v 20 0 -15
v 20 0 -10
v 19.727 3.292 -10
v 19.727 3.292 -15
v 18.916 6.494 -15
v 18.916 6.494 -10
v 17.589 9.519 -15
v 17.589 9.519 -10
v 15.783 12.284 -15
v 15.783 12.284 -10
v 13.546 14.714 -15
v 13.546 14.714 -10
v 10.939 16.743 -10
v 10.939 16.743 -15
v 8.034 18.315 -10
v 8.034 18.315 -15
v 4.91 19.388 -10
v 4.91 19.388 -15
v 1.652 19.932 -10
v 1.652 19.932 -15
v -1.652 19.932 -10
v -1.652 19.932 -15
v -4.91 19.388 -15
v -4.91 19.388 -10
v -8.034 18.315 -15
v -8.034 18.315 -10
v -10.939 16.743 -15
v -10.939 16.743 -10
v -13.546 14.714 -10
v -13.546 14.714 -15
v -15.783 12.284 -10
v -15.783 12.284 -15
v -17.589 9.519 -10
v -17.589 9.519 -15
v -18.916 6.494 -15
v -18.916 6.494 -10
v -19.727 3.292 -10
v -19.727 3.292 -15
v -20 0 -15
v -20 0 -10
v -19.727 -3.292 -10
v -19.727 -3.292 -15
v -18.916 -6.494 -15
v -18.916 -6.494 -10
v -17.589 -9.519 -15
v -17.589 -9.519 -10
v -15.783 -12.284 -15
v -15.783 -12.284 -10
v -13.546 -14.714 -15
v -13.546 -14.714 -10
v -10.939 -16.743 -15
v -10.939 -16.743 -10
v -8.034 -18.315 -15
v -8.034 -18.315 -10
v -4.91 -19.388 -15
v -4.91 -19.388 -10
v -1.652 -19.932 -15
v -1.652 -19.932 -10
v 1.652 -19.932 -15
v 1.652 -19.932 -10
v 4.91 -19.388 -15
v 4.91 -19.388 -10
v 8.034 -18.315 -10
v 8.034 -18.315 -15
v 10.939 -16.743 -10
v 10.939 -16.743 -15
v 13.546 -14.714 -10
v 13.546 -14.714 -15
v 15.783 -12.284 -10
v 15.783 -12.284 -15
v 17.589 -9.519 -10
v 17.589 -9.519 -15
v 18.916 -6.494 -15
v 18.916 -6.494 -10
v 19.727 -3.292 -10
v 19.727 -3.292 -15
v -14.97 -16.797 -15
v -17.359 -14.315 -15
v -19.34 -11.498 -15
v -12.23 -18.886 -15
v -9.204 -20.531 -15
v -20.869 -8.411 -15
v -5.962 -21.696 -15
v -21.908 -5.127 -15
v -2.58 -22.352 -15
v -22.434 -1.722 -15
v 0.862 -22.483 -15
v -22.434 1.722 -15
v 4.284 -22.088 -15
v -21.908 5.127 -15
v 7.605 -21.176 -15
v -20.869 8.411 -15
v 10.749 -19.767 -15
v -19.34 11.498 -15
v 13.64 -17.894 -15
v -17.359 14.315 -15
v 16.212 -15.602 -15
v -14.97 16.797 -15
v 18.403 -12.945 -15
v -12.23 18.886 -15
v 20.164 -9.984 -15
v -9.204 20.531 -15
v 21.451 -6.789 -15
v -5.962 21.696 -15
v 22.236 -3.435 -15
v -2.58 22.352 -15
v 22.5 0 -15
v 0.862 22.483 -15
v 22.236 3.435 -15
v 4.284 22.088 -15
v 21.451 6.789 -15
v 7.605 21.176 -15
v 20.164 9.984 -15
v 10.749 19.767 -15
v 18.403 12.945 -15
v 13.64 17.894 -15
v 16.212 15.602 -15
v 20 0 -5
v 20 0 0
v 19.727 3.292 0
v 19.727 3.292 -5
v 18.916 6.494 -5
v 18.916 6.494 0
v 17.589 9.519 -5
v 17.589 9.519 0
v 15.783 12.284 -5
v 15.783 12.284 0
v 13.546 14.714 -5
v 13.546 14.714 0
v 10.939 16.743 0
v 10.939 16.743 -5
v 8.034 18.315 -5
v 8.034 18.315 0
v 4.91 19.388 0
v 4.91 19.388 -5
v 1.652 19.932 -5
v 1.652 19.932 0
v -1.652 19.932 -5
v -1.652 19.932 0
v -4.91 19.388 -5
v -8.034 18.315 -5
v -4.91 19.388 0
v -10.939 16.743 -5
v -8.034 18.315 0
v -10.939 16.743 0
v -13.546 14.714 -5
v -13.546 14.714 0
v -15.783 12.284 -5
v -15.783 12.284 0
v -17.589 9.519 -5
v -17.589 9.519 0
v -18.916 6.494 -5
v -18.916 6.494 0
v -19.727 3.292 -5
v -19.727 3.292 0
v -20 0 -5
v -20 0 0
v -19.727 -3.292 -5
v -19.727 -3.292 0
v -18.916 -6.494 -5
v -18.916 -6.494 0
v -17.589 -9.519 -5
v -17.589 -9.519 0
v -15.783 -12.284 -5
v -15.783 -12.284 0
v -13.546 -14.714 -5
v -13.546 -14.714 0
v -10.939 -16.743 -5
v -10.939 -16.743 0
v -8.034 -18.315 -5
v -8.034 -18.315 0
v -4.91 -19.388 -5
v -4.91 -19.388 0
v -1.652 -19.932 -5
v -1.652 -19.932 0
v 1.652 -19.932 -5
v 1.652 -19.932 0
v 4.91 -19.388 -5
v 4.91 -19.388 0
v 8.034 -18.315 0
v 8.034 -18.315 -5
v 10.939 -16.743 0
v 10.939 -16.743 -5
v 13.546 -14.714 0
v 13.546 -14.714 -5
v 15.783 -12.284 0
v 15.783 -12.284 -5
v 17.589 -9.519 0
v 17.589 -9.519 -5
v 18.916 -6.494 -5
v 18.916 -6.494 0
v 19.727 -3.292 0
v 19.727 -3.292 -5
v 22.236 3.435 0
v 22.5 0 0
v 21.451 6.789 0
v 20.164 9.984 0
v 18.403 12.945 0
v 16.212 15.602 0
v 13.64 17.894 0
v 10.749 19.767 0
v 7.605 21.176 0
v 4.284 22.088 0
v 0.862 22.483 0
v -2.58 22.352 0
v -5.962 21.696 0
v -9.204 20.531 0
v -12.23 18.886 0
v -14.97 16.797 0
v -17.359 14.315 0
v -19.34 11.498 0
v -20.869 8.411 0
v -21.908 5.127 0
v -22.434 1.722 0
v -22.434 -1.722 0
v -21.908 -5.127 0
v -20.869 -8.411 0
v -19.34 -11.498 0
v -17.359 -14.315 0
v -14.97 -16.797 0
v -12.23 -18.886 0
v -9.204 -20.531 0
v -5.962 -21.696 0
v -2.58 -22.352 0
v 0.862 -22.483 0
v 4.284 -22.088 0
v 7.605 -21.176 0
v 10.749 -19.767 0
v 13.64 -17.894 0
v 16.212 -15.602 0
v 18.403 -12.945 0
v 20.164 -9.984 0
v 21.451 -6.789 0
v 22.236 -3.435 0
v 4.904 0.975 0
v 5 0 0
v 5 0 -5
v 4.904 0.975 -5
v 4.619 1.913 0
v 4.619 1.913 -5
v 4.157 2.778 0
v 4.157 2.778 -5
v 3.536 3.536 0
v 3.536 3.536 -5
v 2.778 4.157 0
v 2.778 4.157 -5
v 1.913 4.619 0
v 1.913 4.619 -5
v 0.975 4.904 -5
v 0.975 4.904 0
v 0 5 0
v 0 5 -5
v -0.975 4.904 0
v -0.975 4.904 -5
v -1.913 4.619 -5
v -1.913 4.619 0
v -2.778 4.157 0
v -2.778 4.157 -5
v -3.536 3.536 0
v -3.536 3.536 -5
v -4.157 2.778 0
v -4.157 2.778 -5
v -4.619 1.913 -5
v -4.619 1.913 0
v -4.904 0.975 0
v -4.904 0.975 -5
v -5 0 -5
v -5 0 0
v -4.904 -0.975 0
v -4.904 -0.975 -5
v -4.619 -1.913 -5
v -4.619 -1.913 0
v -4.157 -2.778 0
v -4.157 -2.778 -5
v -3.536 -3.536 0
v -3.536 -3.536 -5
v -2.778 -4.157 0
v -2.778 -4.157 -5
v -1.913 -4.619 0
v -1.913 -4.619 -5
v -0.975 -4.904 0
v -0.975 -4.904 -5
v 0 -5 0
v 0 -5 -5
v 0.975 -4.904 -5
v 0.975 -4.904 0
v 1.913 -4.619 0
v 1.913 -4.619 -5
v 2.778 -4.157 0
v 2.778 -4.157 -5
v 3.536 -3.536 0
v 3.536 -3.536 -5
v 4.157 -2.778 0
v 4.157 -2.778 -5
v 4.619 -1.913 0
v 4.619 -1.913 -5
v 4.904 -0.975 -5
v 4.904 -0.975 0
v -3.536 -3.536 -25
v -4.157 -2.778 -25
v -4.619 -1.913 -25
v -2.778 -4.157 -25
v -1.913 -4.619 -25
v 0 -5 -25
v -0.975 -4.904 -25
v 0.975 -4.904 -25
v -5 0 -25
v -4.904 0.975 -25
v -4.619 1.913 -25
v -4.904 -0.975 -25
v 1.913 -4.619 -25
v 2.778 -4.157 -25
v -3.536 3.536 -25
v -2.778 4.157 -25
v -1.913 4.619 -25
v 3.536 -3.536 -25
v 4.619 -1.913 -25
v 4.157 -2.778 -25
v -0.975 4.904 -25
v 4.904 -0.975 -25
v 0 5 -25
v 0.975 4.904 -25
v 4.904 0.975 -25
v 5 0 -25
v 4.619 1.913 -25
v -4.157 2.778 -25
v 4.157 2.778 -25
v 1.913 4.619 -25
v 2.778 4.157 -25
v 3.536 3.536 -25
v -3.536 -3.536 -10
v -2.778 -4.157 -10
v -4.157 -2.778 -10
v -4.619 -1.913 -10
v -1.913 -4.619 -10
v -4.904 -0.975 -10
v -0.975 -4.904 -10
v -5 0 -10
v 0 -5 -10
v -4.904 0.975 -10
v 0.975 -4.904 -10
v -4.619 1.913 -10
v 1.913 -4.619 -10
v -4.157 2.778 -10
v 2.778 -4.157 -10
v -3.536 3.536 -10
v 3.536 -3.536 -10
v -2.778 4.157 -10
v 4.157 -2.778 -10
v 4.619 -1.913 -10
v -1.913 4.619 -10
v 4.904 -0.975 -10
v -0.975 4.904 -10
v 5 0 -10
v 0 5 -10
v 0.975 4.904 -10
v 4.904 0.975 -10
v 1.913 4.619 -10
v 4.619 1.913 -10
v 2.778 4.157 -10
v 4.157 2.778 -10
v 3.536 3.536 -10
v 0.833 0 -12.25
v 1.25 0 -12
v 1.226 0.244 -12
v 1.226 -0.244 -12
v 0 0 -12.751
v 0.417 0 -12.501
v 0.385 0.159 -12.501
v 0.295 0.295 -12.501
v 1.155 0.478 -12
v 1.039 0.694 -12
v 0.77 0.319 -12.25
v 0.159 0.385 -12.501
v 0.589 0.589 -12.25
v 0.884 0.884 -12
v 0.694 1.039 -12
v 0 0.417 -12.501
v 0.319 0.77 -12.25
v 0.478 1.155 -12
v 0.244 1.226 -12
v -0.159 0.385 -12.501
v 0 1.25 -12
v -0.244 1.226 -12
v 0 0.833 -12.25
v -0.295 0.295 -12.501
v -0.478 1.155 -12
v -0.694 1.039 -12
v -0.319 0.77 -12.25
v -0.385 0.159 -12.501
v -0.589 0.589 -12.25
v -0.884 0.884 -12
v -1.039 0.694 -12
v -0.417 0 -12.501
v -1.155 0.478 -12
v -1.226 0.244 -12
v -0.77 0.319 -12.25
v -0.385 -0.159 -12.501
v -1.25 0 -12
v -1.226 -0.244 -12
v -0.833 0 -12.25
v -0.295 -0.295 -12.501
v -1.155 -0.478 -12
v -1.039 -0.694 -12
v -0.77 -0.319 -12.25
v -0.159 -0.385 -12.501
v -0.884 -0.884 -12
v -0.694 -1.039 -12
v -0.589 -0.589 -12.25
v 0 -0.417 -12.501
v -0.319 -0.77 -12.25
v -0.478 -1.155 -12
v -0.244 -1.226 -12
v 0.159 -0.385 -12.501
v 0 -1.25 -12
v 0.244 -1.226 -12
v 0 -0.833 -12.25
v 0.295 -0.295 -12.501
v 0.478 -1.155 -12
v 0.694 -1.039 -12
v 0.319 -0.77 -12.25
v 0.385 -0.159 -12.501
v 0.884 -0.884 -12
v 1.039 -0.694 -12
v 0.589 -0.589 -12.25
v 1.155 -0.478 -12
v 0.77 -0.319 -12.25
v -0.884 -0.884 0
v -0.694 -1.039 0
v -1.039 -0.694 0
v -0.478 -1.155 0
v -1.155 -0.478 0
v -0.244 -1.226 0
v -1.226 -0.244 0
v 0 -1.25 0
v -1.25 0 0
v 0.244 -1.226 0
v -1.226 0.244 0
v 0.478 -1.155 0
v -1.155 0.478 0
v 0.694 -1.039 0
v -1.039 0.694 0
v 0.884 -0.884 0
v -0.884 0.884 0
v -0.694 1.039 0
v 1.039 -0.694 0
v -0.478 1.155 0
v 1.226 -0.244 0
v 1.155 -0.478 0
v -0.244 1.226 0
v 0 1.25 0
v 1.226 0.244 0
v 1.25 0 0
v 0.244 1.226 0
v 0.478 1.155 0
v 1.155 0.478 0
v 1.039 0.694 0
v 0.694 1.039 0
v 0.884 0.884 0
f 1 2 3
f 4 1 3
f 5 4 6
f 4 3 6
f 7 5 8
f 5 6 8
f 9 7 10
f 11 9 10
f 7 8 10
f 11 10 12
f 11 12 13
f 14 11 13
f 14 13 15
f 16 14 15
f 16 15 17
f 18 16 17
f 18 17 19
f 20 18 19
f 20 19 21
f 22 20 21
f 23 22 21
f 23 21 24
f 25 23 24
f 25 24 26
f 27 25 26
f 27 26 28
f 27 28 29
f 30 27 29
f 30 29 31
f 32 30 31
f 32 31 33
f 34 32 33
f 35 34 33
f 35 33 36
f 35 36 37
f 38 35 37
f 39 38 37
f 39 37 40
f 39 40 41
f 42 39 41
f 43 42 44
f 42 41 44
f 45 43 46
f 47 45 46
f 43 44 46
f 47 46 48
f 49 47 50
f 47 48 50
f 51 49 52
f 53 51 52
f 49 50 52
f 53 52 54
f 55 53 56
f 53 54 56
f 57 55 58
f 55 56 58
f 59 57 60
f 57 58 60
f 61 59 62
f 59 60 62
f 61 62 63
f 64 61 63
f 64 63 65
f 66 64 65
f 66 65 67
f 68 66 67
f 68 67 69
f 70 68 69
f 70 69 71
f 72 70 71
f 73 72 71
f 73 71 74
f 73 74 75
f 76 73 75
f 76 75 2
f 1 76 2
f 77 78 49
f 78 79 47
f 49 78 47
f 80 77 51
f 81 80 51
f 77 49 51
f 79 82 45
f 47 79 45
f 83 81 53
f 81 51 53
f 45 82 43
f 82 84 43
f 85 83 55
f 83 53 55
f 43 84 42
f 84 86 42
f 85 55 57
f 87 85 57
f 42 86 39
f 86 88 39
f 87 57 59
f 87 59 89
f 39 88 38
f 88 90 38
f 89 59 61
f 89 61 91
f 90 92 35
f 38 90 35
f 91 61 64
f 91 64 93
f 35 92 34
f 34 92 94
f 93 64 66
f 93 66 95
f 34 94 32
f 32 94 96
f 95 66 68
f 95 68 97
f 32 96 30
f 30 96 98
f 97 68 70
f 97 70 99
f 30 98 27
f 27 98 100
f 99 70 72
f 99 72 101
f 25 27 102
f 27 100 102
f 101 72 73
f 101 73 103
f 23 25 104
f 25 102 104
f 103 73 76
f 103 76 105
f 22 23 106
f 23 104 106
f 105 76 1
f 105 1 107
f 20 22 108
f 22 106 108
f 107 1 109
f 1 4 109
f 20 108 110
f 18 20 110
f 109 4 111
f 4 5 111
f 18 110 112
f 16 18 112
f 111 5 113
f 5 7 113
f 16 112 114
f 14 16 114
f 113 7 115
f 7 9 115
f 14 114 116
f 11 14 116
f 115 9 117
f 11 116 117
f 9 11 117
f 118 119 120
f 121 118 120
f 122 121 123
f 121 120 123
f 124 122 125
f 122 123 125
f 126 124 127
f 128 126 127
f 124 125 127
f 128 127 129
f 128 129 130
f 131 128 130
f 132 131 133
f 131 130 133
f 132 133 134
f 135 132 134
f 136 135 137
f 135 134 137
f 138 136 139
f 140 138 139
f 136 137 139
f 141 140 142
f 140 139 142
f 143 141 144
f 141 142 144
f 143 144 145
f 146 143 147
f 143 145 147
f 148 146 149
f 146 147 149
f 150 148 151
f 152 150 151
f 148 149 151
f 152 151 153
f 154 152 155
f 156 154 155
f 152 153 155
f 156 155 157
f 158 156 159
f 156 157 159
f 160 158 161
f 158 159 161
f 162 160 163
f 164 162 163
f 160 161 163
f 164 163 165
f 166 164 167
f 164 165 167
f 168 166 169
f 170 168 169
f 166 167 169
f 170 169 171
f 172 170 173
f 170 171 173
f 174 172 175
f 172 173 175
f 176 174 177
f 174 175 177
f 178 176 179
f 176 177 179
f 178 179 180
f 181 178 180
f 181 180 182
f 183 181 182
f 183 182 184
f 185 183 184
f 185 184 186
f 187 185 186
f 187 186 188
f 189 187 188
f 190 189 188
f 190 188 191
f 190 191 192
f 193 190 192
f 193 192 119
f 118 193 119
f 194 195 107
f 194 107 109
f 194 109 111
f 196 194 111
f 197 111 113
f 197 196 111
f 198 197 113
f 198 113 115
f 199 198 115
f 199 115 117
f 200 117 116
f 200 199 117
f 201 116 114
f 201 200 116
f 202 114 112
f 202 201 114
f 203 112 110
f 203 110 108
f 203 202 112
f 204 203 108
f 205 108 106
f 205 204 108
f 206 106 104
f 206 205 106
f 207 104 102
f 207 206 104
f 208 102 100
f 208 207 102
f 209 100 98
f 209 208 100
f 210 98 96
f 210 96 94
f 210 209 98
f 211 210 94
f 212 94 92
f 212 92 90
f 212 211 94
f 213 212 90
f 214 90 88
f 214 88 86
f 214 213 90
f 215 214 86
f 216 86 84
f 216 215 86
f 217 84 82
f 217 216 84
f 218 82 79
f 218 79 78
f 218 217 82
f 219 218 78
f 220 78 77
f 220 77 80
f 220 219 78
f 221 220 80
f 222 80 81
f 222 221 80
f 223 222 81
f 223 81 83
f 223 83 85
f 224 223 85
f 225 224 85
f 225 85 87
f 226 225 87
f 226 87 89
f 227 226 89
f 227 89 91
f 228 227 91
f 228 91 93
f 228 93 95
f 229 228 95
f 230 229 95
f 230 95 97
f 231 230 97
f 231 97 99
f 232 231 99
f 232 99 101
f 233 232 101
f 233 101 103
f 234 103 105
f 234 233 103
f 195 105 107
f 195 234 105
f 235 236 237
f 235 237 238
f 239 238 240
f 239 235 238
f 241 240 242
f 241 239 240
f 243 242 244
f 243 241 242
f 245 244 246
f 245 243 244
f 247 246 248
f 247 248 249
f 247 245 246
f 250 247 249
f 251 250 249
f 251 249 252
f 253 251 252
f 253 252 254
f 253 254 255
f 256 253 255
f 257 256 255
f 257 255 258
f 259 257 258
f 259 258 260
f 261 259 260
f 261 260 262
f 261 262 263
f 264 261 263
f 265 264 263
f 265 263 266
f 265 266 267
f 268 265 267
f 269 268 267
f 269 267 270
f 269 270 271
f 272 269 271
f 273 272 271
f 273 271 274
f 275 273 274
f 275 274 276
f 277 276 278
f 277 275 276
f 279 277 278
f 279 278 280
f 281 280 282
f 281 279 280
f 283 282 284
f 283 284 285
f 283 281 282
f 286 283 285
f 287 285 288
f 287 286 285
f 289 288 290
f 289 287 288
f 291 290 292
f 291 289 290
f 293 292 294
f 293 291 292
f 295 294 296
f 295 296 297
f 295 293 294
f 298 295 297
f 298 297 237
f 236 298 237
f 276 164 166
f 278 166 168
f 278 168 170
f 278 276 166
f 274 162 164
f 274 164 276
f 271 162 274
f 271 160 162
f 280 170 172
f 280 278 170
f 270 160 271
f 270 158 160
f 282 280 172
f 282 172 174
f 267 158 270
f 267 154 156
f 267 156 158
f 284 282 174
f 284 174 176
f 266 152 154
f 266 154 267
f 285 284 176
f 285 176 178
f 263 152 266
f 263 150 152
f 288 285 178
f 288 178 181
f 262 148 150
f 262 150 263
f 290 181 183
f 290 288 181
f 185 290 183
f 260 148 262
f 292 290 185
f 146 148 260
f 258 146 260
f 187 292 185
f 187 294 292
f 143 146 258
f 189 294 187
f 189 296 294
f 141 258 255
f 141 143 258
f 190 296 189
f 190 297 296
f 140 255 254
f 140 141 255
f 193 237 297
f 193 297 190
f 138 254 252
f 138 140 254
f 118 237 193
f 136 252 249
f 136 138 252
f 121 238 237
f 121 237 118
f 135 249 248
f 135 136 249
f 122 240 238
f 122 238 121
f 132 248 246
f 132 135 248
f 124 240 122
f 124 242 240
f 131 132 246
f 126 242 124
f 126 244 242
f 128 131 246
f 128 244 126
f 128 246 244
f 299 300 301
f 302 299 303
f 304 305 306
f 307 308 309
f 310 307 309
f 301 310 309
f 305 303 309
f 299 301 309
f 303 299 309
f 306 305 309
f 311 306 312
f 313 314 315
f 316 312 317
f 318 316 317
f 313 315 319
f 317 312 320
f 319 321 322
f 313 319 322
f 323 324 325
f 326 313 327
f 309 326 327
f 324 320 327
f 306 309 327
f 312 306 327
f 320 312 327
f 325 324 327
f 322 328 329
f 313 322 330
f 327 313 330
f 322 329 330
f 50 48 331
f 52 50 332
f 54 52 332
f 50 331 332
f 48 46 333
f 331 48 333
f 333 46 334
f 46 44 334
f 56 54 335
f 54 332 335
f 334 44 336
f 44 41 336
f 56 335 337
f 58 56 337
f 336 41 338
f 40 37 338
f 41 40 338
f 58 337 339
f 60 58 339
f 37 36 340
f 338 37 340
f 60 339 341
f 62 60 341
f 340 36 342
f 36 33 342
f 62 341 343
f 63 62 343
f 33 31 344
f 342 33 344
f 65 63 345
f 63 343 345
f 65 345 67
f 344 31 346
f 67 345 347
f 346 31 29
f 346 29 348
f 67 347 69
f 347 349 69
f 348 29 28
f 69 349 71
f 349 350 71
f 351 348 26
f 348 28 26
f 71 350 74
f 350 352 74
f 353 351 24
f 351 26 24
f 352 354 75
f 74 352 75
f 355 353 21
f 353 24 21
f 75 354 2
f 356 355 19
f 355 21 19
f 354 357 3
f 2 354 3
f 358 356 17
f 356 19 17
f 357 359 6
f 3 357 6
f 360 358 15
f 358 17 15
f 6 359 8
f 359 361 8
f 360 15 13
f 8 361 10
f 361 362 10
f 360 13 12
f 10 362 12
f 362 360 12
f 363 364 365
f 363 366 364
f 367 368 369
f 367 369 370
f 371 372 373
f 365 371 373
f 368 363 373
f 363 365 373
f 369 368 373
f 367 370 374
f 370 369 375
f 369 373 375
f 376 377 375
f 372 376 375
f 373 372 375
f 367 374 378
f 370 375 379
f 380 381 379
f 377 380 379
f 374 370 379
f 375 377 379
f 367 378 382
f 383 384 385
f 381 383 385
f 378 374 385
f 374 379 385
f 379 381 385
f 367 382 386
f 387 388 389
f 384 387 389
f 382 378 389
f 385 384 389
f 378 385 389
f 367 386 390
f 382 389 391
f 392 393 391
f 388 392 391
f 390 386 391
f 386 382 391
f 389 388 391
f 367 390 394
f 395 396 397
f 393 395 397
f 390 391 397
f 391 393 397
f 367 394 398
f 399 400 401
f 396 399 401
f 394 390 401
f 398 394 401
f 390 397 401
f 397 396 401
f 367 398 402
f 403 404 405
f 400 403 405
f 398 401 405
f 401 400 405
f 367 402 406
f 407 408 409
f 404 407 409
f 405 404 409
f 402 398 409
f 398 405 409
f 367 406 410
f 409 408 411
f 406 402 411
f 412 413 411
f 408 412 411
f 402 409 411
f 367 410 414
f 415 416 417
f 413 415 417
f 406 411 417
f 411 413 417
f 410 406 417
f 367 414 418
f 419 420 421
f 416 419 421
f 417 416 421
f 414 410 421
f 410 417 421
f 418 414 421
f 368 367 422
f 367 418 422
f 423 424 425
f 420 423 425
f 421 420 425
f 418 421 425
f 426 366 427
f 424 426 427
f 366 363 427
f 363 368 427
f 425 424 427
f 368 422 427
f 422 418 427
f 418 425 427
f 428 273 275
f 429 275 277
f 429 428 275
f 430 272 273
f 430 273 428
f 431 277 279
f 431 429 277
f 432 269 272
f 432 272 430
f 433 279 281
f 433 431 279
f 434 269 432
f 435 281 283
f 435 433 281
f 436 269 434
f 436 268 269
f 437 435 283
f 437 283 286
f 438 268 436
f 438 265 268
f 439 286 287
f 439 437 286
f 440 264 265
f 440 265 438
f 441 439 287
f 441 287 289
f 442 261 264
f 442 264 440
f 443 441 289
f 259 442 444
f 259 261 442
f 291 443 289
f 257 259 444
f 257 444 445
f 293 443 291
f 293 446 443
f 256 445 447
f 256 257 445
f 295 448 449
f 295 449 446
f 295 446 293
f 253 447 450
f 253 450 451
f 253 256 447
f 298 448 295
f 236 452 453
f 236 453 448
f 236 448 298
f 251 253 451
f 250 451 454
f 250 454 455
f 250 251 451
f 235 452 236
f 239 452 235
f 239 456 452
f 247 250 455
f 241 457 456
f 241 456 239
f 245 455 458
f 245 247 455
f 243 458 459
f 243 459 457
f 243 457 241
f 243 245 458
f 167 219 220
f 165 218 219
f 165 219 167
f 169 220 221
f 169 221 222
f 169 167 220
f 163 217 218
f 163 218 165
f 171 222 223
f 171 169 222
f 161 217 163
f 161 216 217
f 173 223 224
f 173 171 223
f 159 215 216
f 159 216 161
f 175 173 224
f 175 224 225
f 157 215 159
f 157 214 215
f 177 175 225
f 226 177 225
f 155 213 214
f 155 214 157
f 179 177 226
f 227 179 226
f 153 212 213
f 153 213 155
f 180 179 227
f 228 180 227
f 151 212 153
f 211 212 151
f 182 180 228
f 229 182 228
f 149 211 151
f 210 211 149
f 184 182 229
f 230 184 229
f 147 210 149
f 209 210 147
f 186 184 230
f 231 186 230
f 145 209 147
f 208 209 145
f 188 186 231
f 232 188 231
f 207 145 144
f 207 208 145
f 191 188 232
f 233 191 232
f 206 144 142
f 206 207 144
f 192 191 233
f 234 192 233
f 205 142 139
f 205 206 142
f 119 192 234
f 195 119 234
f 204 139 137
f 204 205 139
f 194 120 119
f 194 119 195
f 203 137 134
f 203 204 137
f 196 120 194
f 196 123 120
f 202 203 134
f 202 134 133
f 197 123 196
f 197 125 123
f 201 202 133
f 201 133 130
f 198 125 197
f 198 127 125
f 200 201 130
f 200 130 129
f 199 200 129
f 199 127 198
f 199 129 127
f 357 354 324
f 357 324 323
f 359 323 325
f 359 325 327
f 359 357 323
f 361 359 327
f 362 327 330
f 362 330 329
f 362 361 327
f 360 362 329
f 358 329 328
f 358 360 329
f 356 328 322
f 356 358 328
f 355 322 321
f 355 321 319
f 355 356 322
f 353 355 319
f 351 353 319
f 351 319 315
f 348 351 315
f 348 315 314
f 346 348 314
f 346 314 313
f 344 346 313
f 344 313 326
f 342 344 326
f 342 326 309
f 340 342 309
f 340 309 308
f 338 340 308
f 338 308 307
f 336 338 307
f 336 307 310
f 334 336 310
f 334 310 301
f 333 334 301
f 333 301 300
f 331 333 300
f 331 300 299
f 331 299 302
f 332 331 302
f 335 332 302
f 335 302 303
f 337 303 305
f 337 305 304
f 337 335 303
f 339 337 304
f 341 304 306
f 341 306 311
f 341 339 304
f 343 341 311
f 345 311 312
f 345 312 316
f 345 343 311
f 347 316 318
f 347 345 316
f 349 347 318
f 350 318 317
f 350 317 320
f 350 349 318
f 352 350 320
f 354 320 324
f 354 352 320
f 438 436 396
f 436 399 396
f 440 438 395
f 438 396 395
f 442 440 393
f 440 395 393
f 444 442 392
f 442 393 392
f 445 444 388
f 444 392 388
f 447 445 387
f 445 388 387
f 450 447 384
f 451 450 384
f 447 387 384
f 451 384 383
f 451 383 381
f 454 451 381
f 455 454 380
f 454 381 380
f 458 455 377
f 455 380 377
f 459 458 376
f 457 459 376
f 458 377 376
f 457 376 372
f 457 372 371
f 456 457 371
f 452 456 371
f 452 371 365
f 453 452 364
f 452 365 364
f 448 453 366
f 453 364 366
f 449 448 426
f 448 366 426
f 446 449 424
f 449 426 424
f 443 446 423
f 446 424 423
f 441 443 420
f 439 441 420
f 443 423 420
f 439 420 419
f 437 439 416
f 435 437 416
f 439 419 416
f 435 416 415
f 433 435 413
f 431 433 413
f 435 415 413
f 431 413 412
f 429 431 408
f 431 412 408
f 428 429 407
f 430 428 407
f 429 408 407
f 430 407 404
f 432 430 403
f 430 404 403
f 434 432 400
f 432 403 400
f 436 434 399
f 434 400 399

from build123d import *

# Parameters (mm, degrees)
F0_R     = 22.5
F0_R_2   = 20
F1_DEPTH = 15
F0_R_3   = 5
F2_DEPTH = 10
F3_DEPTH = 5
F0_R_4   = 1.25
F4_DEPTH = 25
F5_D     = 2.5
F5_DEPTH = 12
F5_TIP   = 0.7510757738


with BuildPart() as f1:
    # F0 (on Top) → F1 (new body)
    with BuildSketch(Plane.XY):
        Circle(F0_R)
        Circle(F0_R_2, mode=Mode.SUBTRACT)
    extrude(amount=-F1_DEPTH)

    # F0 (on Top) → F2 (join)
    with BuildSketch(Plane.XY):
        Circle(F0_R_2)
        Circle(F0_R_3, mode=Mode.SUBTRACT)
    extrude(amount=-F2_DEPTH)

    # F0 (on Top) → F3 (cut)
    with BuildSketch(Plane.XY):
        Circle(F0_R_2)
        Circle(F0_R_3, mode=Mode.SUBTRACT)
    extrude(amount=-F3_DEPTH, mode=Mode.SUBTRACT)

    # F0 (on Top) → F4 (join)
    with BuildSketch(Plane.XY):
        Circle(F0_R_3)
        Circle(F0_R_4, mode=Mode.SUBTRACT)
        Circle(F0_R_4)
    extrude(amount=-F4_DEPTH)

    # F5
    with Locations(Plane.XY):
        with Locations((0, 0)):
            Hole(F5_D / 2, depth=F5_DEPTH)
            with Locations((0, 0, -(F5_DEPTH + F5_TIP / 2))):  # 118° drill point
                Cone(0, F5_D / 2, F5_TIP, mode=Mode.SUBTRACT)


solid = f1.part
